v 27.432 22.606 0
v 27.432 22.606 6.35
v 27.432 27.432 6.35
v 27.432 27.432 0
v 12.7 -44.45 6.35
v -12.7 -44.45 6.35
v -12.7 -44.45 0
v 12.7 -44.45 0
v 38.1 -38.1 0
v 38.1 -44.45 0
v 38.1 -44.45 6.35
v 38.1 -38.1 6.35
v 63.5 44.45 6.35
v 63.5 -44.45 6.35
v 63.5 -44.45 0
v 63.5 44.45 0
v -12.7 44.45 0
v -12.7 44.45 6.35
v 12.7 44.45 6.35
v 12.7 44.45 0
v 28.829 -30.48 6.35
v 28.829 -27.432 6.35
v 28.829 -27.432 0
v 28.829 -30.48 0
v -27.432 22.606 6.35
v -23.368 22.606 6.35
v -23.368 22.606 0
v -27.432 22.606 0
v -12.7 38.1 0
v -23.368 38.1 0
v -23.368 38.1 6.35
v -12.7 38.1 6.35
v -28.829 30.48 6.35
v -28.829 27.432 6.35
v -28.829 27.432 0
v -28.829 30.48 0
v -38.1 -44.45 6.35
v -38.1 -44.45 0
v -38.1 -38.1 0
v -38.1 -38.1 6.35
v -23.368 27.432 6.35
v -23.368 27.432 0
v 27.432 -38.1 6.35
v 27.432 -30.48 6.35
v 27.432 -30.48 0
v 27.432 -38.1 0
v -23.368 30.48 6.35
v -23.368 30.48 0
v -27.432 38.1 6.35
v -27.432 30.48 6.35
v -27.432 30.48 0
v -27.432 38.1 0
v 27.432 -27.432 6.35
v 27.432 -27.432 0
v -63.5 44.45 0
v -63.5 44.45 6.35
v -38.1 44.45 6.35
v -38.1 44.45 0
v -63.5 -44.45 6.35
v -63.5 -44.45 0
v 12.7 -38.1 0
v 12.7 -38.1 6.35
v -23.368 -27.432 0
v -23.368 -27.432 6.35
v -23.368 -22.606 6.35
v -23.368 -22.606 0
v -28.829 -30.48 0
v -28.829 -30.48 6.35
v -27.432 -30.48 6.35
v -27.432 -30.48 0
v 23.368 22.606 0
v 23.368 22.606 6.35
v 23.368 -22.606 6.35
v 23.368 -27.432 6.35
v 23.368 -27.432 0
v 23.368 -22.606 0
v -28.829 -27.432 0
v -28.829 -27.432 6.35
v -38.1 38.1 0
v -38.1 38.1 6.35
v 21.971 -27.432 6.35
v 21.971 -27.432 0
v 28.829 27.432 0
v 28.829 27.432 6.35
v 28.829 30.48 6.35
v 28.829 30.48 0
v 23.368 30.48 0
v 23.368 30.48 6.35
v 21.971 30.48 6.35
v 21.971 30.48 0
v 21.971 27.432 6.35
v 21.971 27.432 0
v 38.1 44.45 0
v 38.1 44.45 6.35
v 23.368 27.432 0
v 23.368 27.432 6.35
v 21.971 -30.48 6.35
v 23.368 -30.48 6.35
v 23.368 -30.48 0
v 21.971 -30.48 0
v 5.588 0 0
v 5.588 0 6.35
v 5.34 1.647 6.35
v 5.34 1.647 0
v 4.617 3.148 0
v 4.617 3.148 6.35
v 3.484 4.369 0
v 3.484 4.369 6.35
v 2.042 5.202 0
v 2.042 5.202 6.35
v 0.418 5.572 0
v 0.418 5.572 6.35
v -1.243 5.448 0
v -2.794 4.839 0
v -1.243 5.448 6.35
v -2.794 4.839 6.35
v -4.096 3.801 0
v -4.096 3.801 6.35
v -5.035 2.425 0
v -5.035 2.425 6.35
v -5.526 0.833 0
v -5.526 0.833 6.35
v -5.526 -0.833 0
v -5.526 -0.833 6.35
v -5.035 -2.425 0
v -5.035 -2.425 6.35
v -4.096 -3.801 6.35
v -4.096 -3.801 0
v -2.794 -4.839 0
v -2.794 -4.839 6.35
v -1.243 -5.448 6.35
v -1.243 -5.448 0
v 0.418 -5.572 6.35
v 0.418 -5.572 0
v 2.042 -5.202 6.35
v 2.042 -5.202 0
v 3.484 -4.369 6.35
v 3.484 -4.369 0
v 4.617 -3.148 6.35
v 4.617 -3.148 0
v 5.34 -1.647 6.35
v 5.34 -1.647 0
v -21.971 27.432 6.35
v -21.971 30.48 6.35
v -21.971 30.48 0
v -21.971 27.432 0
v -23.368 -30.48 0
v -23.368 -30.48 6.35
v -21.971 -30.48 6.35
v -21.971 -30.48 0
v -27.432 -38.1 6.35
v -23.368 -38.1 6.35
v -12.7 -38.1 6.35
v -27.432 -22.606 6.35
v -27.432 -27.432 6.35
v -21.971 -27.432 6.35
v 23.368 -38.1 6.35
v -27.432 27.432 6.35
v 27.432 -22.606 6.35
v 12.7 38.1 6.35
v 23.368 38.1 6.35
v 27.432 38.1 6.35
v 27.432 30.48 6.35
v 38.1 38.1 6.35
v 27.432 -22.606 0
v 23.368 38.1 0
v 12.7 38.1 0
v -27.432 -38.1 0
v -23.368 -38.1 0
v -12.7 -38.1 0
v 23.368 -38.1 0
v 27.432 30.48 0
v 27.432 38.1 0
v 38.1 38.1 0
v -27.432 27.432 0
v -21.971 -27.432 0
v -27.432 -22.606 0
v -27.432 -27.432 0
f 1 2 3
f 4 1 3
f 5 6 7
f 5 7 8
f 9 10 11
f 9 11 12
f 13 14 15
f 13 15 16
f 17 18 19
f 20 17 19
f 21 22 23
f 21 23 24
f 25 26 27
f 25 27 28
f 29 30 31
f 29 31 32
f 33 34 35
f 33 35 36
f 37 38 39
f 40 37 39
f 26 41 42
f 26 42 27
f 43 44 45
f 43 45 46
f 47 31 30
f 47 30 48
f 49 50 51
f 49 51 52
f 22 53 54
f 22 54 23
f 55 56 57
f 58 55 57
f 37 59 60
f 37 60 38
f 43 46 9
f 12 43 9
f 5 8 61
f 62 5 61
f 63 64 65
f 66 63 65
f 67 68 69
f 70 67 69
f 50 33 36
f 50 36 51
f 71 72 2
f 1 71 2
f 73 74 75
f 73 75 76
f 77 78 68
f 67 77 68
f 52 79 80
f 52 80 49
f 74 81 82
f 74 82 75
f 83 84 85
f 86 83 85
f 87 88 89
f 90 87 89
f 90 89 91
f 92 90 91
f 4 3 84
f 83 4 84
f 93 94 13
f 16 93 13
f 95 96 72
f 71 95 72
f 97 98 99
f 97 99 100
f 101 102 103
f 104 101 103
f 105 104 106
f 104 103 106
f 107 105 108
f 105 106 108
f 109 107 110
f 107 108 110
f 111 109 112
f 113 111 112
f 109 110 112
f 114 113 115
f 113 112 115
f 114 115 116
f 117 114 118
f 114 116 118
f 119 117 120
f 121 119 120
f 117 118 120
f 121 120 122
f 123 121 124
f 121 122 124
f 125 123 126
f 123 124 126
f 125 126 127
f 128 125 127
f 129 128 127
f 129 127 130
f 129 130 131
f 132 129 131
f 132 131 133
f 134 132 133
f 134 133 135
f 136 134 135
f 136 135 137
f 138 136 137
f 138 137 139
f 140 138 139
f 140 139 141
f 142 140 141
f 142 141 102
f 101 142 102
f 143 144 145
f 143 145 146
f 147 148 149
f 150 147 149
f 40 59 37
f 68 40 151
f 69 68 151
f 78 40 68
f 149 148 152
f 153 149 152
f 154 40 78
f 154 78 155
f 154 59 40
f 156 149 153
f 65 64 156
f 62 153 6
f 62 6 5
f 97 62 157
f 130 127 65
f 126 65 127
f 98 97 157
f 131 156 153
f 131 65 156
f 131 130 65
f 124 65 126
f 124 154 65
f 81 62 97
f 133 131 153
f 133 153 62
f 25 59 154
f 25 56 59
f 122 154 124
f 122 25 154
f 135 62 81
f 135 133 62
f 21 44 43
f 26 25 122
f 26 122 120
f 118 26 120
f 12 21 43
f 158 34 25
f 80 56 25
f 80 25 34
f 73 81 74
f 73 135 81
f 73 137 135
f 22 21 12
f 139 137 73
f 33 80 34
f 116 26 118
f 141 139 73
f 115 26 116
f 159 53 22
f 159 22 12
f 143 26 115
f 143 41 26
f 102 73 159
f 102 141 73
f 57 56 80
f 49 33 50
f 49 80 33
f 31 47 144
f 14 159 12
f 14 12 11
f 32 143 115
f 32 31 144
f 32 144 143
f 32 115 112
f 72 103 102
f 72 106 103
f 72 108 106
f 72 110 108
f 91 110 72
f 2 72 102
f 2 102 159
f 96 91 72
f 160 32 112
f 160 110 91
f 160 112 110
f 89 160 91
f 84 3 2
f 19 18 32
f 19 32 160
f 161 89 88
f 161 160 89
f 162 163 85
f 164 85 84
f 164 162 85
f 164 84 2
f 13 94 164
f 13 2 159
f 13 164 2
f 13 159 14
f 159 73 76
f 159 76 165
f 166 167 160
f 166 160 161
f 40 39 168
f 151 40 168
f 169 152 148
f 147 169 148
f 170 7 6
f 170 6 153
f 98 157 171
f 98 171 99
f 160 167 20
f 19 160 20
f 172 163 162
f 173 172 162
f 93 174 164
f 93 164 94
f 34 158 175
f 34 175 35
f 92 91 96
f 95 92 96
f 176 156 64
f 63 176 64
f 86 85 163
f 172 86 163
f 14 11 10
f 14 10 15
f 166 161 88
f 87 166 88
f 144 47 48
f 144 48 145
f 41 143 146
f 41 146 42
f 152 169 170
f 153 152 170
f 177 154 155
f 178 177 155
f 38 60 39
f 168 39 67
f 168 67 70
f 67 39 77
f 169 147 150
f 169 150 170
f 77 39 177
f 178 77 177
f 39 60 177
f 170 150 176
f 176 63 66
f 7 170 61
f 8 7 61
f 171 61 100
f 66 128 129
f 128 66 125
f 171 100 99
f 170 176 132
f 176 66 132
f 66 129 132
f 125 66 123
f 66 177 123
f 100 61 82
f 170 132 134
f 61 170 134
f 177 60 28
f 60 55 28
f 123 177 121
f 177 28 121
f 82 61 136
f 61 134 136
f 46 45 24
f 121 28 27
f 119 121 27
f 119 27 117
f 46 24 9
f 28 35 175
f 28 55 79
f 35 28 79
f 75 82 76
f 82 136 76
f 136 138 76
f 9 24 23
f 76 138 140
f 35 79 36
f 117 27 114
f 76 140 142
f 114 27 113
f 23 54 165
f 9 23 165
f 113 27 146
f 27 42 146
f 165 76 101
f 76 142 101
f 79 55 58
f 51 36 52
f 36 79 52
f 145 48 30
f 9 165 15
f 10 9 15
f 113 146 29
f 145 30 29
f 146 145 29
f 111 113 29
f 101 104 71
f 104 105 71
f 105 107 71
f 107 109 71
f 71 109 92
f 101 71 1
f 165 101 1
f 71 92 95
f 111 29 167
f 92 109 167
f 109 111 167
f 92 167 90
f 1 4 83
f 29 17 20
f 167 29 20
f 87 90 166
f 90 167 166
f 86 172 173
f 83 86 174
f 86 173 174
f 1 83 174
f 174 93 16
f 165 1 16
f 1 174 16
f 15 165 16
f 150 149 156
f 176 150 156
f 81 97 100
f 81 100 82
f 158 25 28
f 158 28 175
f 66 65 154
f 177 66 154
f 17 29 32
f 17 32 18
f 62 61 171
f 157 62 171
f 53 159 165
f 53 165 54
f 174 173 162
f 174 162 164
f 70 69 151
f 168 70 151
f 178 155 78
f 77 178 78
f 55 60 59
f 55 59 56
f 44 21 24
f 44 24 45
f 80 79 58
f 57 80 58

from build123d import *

# Parameters (mm, degrees)
SKETCH2_W           = 127
SKETCH2_H           = 76.2
BOSS_EXTRUDE1_DEPTH = 6.35
SKETCH3_W           = 25.4
SKETCH3_H           = 6.35
BOSS_EXTRUDE2_DEPTH = 6.35
CUT_EXTRUDE1_DEPTH  = 78.771299333
SKETCH5_R           = 5.588
CUT_EXTRUDE2_DEPTH  = 78.771299333


with BuildPart() as part:
    # Sketch2 → Boss-Extrude1 (new body)
    with BuildSketch(Plane.XY):
        Rectangle(SKETCH2_W, SKETCH2_H)
    extrude(amount=BOSS_EXTRUDE1_DEPTH)

    # Sketch3 → Boss-Extrude2 (add)
    with BuildSketch(Plane.XY.offset(6.35)):
        with Locations((0, 41.275)):
            Rectangle(SKETCH3_W, SKETCH3_H)
        with Locations((50.8, 41.275)):
            Rectangle(SKETCH3_W, SKETCH3_H)
        with Locations((50.8, -41.275)):
            Rectangle(SKETCH3_W, SKETCH3_H)
        with Locations((0, -41.275)):
            Rectangle(SKETCH3_W, SKETCH3_H)
        with Locations((-50.8, -41.275)):
            Rectangle(SKETCH3_W, SKETCH3_H)
        with Locations((-50.8, 41.275)):
            Rectangle(SKETCH3_W, SKETCH3_H)
    extrude(amount=-BOSS_EXTRUDE2_DEPTH)

    # Sketch4 → Cut-Extrude1 (cut, through all)
    with BuildSketch(Plane.XY.offset(6.35)):
        Polygon((-27.432, 38.1), (-23.368, 38.1), (-23.368, 30.48), (-21.971, 30.48), (-21.971, 27.432), (-23.368, 27.432), (-23.368, 22.606), (-27.432, 22.606), (-27.432, 27.432), (-28.829, 27.432), (-28.829, 30.48), (-27.432, 30.48), align=None)
        Polygon((27.432, 38.1), (23.368, 38.1), (23.368, 30.48), (21.971, 30.48), (21.971, 27.432), (23.368, 27.432), (23.368, 22.606), (27.432, 22.606), (27.432, 27.432), (28.829, 27.432), (28.829, 30.48), (27.432, 30.48), align=None)
        Polygon((27.432, -38.1), (23.368, -38.1), (23.368, -30.48), (21.971, -30.48), (21.971, -27.432), (23.368, -27.432), (23.368, -22.606), (27.432, -22.606), (27.432, -27.432), (28.829, -27.432), (28.829, -30.48), (27.432, -30.48), align=None)
        Polygon((-27.432, -38.1), (-23.368, -38.1), (-23.368, -30.48), (-21.971, -30.48), (-21.971, -27.432), (-23.368, -27.432), (-23.368, -22.606), (-27.432, -22.606), (-27.432, -27.432), (-28.829, -27.432), (-28.829, -30.48), (-27.432, -30.48), align=None)
    extrude(amount=-CUT_EXTRUDE1_DEPTH, mode=Mode.SUBTRACT)

    # Sketch5 → Cut-Extrude2 (cut, through all)
    with BuildSketch(Plane.XY.offset(6.35)):
        Circle(SKETCH5_R)
    extrude(amount=-CUT_EXTRUDE2_DEPTH, mode=Mode.SUBTRACT)


solid = part.part
